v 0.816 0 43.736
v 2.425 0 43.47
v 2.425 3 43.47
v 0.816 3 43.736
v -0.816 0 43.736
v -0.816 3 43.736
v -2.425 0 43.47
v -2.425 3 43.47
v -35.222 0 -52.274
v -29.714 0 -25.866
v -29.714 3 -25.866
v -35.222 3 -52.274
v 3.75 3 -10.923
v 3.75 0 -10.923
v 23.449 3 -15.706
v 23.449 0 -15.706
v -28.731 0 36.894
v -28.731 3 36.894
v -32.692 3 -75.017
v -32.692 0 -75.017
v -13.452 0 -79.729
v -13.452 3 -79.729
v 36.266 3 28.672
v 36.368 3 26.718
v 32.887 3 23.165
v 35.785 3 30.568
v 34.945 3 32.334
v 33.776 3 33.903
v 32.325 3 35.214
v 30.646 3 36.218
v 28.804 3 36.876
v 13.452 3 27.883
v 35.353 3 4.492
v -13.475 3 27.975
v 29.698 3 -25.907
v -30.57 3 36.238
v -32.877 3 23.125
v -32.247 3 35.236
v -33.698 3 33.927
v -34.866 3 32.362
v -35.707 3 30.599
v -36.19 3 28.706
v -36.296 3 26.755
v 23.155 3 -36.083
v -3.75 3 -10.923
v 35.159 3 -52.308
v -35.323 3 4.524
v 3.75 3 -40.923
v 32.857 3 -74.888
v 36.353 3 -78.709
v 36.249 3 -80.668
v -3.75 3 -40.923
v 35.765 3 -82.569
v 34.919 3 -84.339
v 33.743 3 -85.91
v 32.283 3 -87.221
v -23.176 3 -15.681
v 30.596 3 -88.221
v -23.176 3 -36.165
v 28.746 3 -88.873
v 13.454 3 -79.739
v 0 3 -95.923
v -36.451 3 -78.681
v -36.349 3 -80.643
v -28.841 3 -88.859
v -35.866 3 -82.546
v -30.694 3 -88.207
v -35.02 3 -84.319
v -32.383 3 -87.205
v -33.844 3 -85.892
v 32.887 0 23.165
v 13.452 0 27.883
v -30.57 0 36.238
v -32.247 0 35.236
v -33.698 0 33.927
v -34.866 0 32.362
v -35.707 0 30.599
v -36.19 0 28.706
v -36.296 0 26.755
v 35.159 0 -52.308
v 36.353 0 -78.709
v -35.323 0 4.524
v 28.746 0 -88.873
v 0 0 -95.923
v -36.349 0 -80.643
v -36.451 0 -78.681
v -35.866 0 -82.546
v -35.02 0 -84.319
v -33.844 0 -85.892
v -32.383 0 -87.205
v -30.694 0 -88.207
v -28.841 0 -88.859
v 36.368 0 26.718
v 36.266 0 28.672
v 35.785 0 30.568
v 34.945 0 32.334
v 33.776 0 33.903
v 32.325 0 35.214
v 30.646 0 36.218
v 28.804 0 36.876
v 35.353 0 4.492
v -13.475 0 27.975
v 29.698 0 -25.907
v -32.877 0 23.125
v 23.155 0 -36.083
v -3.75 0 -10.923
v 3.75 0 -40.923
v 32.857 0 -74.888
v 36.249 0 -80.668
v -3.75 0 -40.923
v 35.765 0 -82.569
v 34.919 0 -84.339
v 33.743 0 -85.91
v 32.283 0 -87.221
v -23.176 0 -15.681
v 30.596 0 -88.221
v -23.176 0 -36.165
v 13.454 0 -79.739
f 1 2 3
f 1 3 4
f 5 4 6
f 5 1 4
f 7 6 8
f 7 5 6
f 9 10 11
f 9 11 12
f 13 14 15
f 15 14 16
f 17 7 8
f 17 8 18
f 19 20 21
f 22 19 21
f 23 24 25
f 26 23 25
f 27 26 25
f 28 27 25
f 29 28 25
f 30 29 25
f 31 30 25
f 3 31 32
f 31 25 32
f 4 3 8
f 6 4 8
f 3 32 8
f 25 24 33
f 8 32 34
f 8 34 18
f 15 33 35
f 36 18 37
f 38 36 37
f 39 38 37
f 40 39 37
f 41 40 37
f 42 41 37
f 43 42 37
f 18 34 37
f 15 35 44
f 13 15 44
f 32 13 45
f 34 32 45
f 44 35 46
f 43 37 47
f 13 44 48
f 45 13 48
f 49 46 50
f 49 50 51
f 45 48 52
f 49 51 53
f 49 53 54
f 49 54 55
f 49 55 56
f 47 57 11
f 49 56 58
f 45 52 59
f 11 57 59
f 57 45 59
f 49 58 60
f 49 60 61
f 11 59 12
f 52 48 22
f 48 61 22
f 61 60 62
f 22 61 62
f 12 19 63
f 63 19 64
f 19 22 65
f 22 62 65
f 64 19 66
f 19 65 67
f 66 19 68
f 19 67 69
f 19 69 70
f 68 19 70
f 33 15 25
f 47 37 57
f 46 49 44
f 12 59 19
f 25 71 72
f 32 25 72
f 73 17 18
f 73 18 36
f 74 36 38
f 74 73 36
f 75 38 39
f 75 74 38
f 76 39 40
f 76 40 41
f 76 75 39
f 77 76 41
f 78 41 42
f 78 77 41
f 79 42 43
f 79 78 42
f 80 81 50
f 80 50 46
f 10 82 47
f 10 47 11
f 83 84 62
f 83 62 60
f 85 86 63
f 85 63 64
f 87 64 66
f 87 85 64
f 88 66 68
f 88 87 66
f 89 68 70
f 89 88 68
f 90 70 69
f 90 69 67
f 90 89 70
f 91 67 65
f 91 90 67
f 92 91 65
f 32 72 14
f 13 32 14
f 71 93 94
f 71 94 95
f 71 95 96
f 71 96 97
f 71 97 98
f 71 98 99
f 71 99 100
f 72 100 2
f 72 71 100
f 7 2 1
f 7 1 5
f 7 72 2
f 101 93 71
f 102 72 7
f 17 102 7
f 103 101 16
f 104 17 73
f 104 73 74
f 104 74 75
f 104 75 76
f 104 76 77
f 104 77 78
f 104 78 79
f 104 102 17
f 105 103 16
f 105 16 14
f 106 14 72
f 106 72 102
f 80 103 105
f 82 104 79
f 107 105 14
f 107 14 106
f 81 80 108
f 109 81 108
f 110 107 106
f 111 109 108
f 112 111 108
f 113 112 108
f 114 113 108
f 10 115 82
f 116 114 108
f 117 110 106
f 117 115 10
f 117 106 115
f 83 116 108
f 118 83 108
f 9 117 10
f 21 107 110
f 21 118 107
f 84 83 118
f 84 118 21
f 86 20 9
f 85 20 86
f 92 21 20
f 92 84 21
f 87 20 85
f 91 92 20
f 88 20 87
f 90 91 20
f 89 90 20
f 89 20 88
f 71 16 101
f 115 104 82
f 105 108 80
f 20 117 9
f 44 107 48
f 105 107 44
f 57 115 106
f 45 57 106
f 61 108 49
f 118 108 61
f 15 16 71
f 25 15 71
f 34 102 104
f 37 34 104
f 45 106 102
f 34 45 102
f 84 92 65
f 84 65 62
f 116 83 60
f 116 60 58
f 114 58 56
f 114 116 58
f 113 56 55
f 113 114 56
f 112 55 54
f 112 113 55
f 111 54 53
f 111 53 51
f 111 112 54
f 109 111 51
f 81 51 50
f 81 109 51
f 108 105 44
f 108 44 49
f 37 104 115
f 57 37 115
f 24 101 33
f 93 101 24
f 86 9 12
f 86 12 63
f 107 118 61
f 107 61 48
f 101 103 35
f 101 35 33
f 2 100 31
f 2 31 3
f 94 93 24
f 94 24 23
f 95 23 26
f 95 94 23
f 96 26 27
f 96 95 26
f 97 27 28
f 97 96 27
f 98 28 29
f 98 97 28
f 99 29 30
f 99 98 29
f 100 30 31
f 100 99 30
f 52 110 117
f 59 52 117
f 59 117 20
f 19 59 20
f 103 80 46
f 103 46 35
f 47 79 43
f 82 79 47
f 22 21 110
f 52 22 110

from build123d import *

# Parameters (mm, degrees)
SALIENTE_EXTRUIR1_DEPTH = 3


with BuildPart() as part:
    # Croquis1 → Saliente-Extruir1 (new body)
    with BuildSketch(Plane(origin=(0, 0, 0), x_dir=(1, 0, 0), z_dir=(0, 1, 0))):
        with BuildLine():
            Line((-35.322649353, -4.523785763), (-29.713798408, 25.866039525))
            Line((-29.713798408, 25.866039525), (-35.221795469, 52.273603799))
            Line((-35.221795469, 52.273603799), (-36.45117663, 78.681168073))
            ThreePointArc((-36.45117663, 78.681168073), (-34.470773885, 85.134483293), (-28.840989272, 88.859103754))
            Line((-28.840989272, 88.859103754), (0, 95.923167849))
            Line((0, 95.923167849), (28.745582144, 88.873347738))
            ThreePointArc((28.745582144, 88.873347738), (34.369430491, 85.153487685), (36.353462125, 78.709215227))
            Line((36.353462125, 78.709215227), (35.159044734, 52.307970662))
            Line((35.159044734, 52.307970662), (29.69822954, 25.906726097))
            Line((29.69822954, 25.906726097), (35.352965357, -4.492390106))
            Line((35.352965357, -4.492390106), (36.368027066, -26.718230301))
            ThreePointArc((36.368027066, -26.718230301), (34.398862632, -33.147130574), (28.803795931, -36.875883169))
            Line((28.803795931, -36.875883169), (2.42535625, -43.470493089))
            ThreePointArc((2.42535625, -43.470493089), (0, -43.769068087), (-2.42535625, -43.470493089))
            Line((-2.42535625, -43.470493089), (-28.730703822, -36.894156196))
            ThreePointArc((-28.730703822, -36.894156196), (-34.320110297, -33.172996946), (-36.295781209, -26.755426116))
            Line((-36.295781209, -26.755426116), (-35.322649353, -4.523785763))
        make_face()
        Polygon((-3.75, 40.923167849), (-23.175796102, 36.165180269), (-32.691771262, 75.016772472), (-13.451535653, 79.72931046), align=None, mode=Mode.SUBTRACT)
        Polygon((13.453962591, 79.739018214), (3.75, 40.923167849), (23.155384938, 36.082606371), (32.856809939, 74.888306377), align=None, mode=Mode.SUBTRACT)
        Polygon((-3.75, 10.923167849), (-13.474641094, -27.975396528), (-32.877491097, -23.124684028), (-23.176066096, 15.681015978), align=None, mode=Mode.SUBTRACT)
        Polygon((3.75, 10.923167849), (23.449436749, 15.706069173), (32.88700521, -23.164643472), (13.451648888, -27.883427703), align=None, mode=Mode.SUBTRACT)
    extrude(amount=SALIENTE_EXTRUIR1_DEPTH)


solid = part.part
